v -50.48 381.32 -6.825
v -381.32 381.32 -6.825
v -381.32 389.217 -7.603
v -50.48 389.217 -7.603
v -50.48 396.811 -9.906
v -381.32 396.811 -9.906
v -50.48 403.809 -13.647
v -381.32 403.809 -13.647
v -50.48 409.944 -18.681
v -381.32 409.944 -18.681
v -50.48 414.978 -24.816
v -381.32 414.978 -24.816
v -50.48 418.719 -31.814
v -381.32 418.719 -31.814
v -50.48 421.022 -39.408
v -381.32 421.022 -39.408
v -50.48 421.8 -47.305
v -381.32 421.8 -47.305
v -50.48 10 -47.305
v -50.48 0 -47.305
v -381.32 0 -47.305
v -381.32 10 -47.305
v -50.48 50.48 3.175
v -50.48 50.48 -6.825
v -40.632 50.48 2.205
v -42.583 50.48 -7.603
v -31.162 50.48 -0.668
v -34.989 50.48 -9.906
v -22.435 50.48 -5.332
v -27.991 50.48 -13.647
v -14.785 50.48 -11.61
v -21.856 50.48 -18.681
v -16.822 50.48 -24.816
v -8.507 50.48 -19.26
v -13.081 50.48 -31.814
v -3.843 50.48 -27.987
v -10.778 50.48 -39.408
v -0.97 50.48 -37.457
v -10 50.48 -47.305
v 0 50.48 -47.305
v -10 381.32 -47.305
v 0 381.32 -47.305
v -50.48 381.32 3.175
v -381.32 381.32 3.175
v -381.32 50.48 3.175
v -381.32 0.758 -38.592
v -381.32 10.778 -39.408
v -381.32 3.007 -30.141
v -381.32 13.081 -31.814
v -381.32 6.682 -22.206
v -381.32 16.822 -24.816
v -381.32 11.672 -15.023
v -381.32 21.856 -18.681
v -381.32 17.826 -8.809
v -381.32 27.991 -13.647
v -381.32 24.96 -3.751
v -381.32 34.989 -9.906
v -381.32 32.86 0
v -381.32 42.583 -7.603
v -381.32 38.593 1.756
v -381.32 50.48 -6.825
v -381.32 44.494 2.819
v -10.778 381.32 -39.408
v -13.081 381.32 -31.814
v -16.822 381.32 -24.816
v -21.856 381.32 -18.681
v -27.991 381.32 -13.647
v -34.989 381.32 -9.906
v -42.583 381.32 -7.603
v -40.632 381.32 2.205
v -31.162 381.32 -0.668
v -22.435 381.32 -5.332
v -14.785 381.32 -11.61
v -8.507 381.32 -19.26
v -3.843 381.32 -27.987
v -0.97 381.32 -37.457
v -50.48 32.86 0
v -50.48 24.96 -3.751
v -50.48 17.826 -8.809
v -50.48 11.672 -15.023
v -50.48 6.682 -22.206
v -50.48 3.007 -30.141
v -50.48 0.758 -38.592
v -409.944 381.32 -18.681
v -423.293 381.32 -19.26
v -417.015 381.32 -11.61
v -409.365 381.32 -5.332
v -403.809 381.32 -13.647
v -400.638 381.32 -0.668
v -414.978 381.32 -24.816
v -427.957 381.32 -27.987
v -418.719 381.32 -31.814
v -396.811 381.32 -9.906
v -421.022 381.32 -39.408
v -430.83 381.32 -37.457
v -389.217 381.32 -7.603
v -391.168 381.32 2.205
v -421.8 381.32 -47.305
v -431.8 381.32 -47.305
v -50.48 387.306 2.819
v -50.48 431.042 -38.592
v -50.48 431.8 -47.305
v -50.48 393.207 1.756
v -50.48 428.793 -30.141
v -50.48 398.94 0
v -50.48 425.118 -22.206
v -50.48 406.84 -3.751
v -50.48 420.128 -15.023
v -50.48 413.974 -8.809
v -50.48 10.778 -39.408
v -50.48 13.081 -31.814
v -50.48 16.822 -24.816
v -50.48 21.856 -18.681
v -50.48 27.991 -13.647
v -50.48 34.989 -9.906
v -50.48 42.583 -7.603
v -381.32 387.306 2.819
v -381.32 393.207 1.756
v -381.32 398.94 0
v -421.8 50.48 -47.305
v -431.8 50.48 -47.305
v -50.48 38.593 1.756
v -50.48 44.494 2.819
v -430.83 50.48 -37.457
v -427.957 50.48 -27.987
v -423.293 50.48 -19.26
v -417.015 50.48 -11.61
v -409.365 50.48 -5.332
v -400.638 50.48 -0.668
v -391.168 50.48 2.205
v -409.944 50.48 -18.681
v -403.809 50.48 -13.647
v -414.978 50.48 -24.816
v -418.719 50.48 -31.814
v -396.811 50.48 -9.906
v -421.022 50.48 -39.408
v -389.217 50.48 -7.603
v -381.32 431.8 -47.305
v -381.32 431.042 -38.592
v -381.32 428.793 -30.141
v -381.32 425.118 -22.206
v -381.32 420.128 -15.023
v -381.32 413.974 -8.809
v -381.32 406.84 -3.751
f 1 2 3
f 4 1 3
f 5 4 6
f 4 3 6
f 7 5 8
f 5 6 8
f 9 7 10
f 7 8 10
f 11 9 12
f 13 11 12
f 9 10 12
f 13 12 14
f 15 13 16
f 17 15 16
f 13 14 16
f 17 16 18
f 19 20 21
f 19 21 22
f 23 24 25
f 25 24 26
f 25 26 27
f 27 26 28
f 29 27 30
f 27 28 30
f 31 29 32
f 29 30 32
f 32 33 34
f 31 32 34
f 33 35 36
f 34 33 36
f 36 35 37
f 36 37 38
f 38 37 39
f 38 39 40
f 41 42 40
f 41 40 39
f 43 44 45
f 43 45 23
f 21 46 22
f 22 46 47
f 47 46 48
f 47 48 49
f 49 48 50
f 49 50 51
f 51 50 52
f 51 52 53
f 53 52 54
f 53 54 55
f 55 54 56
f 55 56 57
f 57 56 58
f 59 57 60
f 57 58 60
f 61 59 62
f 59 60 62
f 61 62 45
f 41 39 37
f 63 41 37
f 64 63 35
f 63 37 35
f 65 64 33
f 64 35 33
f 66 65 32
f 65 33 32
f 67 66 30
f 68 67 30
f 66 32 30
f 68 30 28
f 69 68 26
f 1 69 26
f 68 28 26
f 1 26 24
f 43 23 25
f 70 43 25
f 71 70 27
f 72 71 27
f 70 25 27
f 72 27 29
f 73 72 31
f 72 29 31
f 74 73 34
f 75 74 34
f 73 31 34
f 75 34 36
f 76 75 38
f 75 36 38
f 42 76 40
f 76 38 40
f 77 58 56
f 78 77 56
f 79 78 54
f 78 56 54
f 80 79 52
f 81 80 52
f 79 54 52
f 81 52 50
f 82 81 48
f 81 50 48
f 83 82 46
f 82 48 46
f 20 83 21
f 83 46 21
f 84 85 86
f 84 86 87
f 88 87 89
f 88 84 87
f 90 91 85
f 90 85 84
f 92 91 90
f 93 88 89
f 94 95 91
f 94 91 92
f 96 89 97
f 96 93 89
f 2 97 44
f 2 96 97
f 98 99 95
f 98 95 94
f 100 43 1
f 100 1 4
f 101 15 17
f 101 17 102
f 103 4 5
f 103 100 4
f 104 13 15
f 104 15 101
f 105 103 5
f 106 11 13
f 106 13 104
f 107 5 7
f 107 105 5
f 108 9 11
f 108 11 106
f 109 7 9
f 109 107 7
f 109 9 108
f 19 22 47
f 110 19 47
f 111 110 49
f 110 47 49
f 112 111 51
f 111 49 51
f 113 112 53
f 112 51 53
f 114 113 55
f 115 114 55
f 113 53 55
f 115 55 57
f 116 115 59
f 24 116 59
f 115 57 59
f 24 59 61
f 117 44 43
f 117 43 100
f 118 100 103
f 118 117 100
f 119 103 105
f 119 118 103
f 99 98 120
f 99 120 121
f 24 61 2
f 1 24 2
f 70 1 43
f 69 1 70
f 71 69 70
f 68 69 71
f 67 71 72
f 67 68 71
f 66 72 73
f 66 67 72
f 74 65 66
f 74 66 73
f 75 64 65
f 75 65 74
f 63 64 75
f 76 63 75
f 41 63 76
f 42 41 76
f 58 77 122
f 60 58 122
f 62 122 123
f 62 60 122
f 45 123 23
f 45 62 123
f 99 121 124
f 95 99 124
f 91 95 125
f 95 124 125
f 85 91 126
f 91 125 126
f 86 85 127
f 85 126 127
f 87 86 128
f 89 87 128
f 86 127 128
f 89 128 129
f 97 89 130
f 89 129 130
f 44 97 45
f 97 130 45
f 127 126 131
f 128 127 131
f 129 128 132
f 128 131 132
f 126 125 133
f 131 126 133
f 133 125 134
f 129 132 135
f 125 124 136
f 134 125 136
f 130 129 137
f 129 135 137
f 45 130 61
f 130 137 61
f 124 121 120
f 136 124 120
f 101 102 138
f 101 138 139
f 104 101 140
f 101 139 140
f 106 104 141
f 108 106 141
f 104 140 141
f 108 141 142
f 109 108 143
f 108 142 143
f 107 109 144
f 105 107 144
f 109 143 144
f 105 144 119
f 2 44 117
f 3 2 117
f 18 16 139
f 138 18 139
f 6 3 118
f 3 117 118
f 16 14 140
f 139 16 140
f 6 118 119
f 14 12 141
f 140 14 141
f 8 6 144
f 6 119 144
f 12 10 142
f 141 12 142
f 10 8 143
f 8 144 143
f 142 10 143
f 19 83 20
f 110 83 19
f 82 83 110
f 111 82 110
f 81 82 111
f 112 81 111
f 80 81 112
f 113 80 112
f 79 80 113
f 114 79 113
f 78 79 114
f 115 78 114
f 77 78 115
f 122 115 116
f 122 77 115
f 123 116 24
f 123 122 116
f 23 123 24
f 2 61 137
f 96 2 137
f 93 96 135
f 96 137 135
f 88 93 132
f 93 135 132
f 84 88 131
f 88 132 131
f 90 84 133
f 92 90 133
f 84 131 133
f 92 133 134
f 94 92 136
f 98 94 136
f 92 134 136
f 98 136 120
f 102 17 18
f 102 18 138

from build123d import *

# Parameters (mm, degrees)
SKETCH1_W                  = 431.8
SKETCH1_H                  = 431.8
BOSS_EXTRUDE1_DEPTH        = 3.175
CONVERT_SOLID2_START       = -431.8
CONVERT_SOLID2_DEPTH       = 431.8
CONVERT_SOLID2_2_DEPTH     = 50.480000066
CONVERT_SOLID2_START_2     = -50.480000066
CONVERT_SOLID2_3_DEPTH     = 50.480000066
CONVERT_SOLID2_START_3     = -381.319999934
CONVERT_SOLID2_4_DEPTH     = 330.839999868
CONVERT_SOLID2_START_4     = -387.436868
CONVERT_SOLID2_5_OUTLINE_W = 330.839999868
CONVERT_SOLID2_5_OUTLINE_H = 6.825
CONVERT_SOLID2_5_DEPTH     = 345.44
CONVERT_SOLID2_START_5     = 50.480000066
CONVERT_SOLID2_6_DEPTH     = 330.839999868


with BuildPart() as part:
    # Sketch1 → Boss-Extrude1 (new body)
    with BuildSketch(Plane.XY):
        with Locations((-215.9, 215.9)):
            Rectangle(SKETCH1_W, SKETCH1_H)
    extrude(amount=BOSS_EXTRUDE1_DEPTH)

    # Convert-Solid2: read off the stored shape, not the designer's step
    # Convert-Solid2 outline → Convert-Solid2 (cut)
    with BuildSketch(Plane.YZ.offset(CONVERT_SOLID2_START)):
        with BuildLine():
            ThreePointArc((32.859915633, 0), (41.528072893, 2.37490942), (50.480000066, 3.175))
            Line((50.480000066, 3.175), (0, 3.175))
            Line((0, 3.175), (0, 0))
            Line((0, 0), (32.859915633, 0))
        make_face()
        with BuildLine():
            Line((431.8, 3.175), (381.319999934, 3.175))
            ThreePointArc((381.319999934, 3.175), (390.271927107, 2.37490942), (398.940084367, 0))
            Line((398.940084367, 0), (431.8, 0))
            Line((431.8, 0), (431.8, 3.175))
        make_face()
    extrude(amount=CONVERT_SOLID2_DEPTH, mode=Mode.SUBTRACT)

    # Convert-Solid2 2 outline → Convert-Solid2 2 (cut)
    with BuildSketch(Plane.YZ.offset(CONVERT_SOLID2_START)):
        with BuildLine():
            Line((32.859915633, 0), (398.940084367, 0))
            ThreePointArc((398.940084367, 0), (390.271927107, 2.37490942), (381.319999934, 3.175))
            Line((381.319999934, 3.175), (50.480000066, 3.175))
            ThreePointArc((50.480000066, 3.175), (41.528072893, 2.37490942), (32.859915633, 0))
        make_face()
    extrude(amount=CONVERT_SOLID2_2_DEPTH, mode=Mode.SUBTRACT)

    # Convert-Solid2 3 outline → Convert-Solid2 3 (cut)
    with BuildSketch(Plane.YZ.offset(CONVERT_SOLID2_START_2)):
        with BuildLine():
            Line((32.859915633, 0), (398.940084367, 0))
            ThreePointArc((398.940084367, 0), (390.271927107, 2.37490942), (381.319999934, 3.175))
            Line((381.319999934, 3.175), (50.480000066, 3.175))
            ThreePointArc((50.480000066, 3.175), (41.528072893, 2.37490942), (32.859915633, 0))
        make_face()
    extrude(amount=CONVERT_SOLID2_3_DEPTH, mode=Mode.SUBTRACT)

    # Convert-Solid2 4 outline → Convert-Solid2 4 (add)
    with BuildSketch(Plane.YZ.offset(CONVERT_SOLID2_START_3)):
        with BuildLine():
            ThreePointArc((10, -47.305000066), (21.856317517, -18.681317517), (50.480000066, -6.825))
            Line((50.480000066, -6.825), (381.319999934, -6.825))
            ThreePointArc((381.319999934, -6.825), (409.943682483, -18.681317517), (421.8, -47.305000066))
            Line((421.8, -47.305000066), (431.8, -47.305000066))
            ThreePointArc((431.8, -47.305000066), (422.778969229, -18.505967588), (398.940084367, 0))
            Line((398.940084367, 0), (32.859915633, 0))
            ThreePointArc((32.859915633, 0), (9.021030771, -18.505967588), (0, -47.305000066))
            Line((0, -47.305000066), (10, -47.305000066))
        make_face()
    extrude(amount=CONVERT_SOLID2_4_DEPTH)

    # Convert-Solid2 5 outline → Convert-Solid2 5 (add)
    with BuildSketch(Plane.YZ.offset(CONVERT_SOLID2_START_4)):
        with Locations((215.9, -3.4125)):
            Rectangle(CONVERT_SOLID2_5_OUTLINE_W, CONVERT_SOLID2_5_OUTLINE_H)
    extrude(amount=CONVERT_SOLID2_5_DEPTH)

    # Convert-Solid2 6 outline → Convert-Solid2 6 (add)
    with BuildSketch(Plane(origin=(0, 0, 0), x_dir=(1, 0, 0), z_dir=(0, 1, 0)).offset(CONVERT_SOLID2_START_5)):
        with BuildLine():
            ThreePointArc((-50.480000066, -3.175), (-14.785249705, 11.610249705), (0, 47.305000066))
            Line((0, 47.305000066), (-10, 47.305000066))
            ThreePointArc((-10, 47.305000066), (-21.856317517, 18.681317517), (-50.480000066, 6.825))
            Line((-50.480000066, 6.825), (-50.480000066, 0))
            Line((-50.480000066, 0), (-50.480000066, -3.175))
        make_face()
        with BuildLine():
            ThreePointArc((-381.319999934, 6.825), (-409.943682483, 18.681317517), (-421.8, 47.305000066))
            Line((-421.8, 47.305000066), (-431.8, 47.305000066))
            ThreePointArc((-431.8, 47.305000066), (-417.014750295, 11.610249705), (-381.319999934, -3.175))
            Line((-381.319999934, -3.175), (-381.319999934, 0))
            Line((-381.319999934, 0), (-381.319999934, 6.825))
        make_face()
    extrude(amount=CONVERT_SOLID2_6_DEPTH)


solid = part.part
